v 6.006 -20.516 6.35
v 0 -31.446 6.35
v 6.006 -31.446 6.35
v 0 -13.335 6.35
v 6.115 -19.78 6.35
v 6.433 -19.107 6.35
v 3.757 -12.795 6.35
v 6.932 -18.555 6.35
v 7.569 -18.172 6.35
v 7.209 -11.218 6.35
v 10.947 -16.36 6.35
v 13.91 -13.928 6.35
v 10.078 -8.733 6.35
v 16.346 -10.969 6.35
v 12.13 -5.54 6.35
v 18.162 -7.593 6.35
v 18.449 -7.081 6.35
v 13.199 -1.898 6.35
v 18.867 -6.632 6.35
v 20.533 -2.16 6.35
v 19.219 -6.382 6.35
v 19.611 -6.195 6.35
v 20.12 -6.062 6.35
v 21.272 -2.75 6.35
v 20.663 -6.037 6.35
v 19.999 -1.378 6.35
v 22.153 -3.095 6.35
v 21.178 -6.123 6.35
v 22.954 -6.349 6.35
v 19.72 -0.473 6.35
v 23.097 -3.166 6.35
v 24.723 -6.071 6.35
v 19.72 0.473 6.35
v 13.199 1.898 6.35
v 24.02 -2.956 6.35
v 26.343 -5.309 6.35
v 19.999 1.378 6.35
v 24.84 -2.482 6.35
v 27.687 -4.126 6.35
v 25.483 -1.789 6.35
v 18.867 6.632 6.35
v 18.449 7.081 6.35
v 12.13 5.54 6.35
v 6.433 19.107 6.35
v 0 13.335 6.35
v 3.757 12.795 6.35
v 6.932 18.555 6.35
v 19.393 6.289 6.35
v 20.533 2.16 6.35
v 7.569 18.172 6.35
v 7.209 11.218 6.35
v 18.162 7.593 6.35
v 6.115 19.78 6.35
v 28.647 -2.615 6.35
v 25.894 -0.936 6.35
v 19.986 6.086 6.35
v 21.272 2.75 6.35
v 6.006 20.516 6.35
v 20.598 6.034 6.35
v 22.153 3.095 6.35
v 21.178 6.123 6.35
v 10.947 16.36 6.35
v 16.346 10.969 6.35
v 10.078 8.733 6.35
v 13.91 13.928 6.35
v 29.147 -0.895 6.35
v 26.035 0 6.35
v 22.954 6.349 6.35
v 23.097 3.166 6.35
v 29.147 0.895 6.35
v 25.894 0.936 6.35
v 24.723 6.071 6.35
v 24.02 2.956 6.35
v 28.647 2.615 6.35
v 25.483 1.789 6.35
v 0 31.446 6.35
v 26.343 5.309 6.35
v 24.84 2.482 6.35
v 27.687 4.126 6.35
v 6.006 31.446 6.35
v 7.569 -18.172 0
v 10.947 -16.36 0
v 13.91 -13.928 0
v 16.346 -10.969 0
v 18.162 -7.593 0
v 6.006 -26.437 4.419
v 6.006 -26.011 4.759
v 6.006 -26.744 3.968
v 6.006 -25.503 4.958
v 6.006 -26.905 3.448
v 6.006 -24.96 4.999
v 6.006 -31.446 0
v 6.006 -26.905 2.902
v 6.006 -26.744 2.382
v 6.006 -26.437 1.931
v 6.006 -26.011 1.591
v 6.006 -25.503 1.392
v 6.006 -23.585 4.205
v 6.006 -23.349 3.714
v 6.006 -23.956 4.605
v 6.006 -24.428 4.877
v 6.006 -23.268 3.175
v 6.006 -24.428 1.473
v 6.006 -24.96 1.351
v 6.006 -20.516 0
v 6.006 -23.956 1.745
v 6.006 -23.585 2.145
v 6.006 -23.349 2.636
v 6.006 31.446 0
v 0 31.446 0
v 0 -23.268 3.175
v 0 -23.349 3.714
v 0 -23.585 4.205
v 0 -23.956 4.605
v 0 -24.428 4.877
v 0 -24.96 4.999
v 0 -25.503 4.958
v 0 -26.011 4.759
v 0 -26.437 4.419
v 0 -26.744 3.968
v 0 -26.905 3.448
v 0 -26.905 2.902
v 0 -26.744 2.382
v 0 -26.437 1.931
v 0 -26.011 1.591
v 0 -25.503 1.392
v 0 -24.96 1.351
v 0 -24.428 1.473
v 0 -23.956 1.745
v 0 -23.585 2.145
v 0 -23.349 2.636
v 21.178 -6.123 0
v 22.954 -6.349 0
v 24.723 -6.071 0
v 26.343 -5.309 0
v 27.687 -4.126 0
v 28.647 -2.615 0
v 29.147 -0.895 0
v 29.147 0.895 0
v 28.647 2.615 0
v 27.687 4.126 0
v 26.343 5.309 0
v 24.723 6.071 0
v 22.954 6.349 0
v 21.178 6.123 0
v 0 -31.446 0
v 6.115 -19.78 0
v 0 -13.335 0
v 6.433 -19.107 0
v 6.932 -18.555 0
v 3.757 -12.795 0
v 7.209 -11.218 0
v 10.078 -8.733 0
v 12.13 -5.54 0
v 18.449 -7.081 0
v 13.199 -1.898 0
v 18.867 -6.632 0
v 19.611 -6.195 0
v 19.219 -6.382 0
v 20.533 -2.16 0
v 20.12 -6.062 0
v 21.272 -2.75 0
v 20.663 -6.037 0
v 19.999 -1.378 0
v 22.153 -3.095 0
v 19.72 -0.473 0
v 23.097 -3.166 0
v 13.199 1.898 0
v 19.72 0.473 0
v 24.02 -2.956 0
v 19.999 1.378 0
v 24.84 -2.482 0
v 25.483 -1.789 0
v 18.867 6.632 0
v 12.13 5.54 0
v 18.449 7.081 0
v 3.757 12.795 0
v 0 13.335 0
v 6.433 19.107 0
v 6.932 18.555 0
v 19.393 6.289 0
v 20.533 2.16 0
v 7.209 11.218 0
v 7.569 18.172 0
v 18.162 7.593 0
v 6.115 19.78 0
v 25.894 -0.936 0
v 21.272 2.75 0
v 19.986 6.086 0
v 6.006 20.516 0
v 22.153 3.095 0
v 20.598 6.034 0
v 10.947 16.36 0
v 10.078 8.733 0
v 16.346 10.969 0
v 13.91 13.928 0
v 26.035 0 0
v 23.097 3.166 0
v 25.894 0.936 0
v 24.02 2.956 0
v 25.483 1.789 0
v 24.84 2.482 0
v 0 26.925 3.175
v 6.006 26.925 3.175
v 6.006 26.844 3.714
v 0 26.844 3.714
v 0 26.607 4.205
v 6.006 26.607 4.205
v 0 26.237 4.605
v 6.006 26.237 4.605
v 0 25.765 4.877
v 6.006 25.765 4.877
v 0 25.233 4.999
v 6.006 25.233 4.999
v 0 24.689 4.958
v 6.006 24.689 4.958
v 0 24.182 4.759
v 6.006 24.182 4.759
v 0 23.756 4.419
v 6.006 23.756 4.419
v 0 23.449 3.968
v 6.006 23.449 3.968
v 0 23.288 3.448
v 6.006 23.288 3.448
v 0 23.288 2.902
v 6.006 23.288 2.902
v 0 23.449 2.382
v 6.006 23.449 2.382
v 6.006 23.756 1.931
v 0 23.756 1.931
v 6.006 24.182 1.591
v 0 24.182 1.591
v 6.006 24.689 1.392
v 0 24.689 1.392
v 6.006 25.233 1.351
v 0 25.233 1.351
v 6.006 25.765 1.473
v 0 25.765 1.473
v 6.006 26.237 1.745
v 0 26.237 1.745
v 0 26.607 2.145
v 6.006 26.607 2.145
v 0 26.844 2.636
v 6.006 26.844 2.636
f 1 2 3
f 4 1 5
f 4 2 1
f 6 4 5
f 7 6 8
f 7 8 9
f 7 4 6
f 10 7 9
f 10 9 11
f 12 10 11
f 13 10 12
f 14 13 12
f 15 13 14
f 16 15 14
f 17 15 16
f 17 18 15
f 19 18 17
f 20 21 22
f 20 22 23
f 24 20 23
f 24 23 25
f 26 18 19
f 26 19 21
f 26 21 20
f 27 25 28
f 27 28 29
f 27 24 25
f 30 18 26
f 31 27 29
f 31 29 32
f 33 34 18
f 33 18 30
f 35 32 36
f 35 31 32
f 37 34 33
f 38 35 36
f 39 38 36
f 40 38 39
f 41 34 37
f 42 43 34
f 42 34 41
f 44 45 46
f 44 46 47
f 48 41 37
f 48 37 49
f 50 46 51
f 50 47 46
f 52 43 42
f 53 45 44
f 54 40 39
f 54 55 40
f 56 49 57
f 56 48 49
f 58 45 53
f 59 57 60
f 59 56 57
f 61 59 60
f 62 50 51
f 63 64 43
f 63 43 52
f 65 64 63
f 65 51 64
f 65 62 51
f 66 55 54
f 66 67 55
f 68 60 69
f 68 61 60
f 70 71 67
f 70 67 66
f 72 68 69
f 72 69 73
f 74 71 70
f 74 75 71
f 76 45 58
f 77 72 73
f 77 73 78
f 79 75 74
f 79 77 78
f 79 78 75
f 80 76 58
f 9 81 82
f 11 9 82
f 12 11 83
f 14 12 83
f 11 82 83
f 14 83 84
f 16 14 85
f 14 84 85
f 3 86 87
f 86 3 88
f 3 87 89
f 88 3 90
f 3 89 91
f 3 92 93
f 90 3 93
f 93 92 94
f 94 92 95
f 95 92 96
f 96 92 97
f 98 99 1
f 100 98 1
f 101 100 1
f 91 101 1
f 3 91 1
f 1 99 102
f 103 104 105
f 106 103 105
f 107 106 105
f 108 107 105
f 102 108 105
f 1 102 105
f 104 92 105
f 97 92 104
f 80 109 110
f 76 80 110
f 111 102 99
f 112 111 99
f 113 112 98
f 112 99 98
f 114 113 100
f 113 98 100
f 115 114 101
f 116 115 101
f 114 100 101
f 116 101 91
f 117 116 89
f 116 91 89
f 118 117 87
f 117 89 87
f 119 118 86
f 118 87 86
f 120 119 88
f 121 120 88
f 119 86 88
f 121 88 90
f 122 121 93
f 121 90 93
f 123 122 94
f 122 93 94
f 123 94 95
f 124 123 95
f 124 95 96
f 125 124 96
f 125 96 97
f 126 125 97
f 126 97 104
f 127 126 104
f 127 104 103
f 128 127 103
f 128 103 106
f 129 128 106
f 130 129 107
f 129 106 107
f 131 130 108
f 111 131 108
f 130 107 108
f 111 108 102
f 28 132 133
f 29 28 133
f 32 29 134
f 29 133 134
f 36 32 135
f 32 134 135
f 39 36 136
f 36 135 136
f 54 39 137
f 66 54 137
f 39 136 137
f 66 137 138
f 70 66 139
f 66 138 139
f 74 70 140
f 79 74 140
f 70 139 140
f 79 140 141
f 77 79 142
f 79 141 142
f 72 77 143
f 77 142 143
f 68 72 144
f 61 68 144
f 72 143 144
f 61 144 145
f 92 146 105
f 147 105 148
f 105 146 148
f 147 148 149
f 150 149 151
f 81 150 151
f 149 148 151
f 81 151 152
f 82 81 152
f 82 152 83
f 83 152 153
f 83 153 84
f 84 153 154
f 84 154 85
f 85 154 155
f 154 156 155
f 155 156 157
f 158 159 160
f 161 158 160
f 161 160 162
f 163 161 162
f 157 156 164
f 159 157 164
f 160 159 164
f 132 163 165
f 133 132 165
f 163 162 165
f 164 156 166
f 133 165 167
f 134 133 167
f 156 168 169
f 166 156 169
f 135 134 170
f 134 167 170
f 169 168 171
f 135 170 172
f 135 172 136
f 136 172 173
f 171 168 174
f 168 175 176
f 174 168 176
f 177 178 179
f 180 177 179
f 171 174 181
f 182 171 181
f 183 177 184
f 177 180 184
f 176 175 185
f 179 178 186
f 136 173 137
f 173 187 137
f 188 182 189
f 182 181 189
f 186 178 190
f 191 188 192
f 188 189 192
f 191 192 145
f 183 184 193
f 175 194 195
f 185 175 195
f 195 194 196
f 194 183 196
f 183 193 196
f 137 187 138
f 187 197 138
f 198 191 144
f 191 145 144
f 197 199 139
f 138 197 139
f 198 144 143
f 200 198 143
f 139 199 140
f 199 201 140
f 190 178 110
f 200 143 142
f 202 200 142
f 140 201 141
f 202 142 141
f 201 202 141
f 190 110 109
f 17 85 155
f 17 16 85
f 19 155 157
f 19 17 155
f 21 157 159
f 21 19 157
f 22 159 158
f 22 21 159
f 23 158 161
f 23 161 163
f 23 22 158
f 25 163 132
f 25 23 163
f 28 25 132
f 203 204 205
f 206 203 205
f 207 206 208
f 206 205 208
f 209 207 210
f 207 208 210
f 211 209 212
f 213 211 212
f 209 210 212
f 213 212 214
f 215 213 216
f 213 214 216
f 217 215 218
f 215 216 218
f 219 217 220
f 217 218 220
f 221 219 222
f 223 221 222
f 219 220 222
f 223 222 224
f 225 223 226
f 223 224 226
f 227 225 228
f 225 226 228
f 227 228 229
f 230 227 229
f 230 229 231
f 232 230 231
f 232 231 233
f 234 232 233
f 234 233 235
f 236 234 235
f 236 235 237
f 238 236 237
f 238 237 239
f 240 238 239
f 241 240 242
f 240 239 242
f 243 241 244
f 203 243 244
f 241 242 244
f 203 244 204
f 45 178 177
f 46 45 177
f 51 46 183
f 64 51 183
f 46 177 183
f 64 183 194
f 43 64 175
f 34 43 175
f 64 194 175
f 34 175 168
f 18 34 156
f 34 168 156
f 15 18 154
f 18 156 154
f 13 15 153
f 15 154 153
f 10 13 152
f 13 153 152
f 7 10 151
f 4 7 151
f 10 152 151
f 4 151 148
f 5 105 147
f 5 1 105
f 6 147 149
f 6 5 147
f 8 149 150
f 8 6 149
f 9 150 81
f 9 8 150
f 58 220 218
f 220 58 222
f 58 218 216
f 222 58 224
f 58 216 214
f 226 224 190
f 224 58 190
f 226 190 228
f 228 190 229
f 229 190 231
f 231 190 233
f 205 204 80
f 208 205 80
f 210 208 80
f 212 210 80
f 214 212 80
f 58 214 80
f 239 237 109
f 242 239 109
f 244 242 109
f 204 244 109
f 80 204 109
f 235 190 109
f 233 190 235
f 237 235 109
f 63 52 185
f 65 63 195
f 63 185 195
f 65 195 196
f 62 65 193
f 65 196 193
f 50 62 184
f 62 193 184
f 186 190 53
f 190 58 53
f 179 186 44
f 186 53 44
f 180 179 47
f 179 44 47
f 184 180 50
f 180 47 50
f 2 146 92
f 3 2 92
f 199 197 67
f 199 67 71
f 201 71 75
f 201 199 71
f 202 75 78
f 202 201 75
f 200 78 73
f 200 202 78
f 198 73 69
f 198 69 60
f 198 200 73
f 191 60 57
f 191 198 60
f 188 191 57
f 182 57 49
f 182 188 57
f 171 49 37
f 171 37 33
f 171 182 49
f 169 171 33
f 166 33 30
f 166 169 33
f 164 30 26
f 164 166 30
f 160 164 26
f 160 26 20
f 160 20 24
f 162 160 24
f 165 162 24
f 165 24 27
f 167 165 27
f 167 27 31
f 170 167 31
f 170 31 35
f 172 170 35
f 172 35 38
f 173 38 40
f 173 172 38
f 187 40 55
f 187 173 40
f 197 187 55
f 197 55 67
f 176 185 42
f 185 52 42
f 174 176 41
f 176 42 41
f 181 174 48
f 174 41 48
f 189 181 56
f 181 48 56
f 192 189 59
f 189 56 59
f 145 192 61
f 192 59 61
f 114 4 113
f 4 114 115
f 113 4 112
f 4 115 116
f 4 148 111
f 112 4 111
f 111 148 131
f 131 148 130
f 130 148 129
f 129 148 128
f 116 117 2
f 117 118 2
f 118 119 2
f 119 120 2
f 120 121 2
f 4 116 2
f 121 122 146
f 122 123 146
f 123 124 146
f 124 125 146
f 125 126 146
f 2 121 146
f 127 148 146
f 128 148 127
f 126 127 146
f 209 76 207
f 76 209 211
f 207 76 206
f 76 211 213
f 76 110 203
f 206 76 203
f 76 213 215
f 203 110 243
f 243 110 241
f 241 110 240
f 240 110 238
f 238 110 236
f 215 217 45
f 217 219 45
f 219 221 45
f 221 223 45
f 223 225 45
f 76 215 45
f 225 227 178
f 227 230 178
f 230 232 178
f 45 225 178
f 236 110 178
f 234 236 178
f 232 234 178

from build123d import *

# Parameters (mm, degrees)
F0_R     = 3.175
F1_DEPTH = 6.35
F2_R     = 1.8288
F3_R     = 1.8288
F4_DEPTH = 6.005883
F5_R     = 2.54


with BuildPart() as f1:
    # F0 (on Top) → F1 (new body)
    with BuildSketch(Plane.XY):
        with BuildLine():
            ThreePointArc((0, 13.335), (13.335, 0), (0, -13.335))
            Line((0, -13.335), (0, -31.446429))
            Line((0, -31.446429), (6.005883, -31.446429))
            Line((6.005883, -31.446429), (6.005883, -18.746429))
            ThreePointArc((6.005883, -18.746429), (14.263495, -13.566575), (19.023542, -5.060048))
            ThreePointArc((19.023542, -5.060048), (29.21, 0), (19.023542, 5.060048))
            ThreePointArc((19.023542, 5.060048), (14.263495, 13.566575), (6.005883, 18.746429))
            Line((6.005883, 18.746429), (6.005883, 31.446429))
            Line((6.005883, 31.446429), (0, 31.446429))
            Line((0, 31.446429), (0, 13.335))
        make_face()
        with Locations((22.86, 0)):
            Circle(F0_R, mode=Mode.SUBTRACT)
    extrude(amount=F1_DEPTH)

    # F2 (on face) + F3 (on face) → F4 (cut, through all)
    with BuildSketch(Plane.YZ.offset(6.005883)):
        with Locations((-25.096429, 3.175)):
            Circle(F2_R)
    with BuildSketch(Plane.YZ.offset(6.005883)):
        with Locations((25.096429, 3.175)):
            Circle(F3_R)
    extrude(amount=-F4_DEPTH, mode=Mode.SUBTRACT)

    # F5
    f5_edges = [f1.edges().sort_by_distance(p)[0] for p in [
        (19.023542, 5.060048, 3.175),
        (19.023542, -5.060048, 3.175),
        (6.005883, -18.746429, 3.175),
        (6.005883, 18.746429, 3.175),
    ]]
    fillet(f5_edges, radius=F5_R)


solid = f1.part
